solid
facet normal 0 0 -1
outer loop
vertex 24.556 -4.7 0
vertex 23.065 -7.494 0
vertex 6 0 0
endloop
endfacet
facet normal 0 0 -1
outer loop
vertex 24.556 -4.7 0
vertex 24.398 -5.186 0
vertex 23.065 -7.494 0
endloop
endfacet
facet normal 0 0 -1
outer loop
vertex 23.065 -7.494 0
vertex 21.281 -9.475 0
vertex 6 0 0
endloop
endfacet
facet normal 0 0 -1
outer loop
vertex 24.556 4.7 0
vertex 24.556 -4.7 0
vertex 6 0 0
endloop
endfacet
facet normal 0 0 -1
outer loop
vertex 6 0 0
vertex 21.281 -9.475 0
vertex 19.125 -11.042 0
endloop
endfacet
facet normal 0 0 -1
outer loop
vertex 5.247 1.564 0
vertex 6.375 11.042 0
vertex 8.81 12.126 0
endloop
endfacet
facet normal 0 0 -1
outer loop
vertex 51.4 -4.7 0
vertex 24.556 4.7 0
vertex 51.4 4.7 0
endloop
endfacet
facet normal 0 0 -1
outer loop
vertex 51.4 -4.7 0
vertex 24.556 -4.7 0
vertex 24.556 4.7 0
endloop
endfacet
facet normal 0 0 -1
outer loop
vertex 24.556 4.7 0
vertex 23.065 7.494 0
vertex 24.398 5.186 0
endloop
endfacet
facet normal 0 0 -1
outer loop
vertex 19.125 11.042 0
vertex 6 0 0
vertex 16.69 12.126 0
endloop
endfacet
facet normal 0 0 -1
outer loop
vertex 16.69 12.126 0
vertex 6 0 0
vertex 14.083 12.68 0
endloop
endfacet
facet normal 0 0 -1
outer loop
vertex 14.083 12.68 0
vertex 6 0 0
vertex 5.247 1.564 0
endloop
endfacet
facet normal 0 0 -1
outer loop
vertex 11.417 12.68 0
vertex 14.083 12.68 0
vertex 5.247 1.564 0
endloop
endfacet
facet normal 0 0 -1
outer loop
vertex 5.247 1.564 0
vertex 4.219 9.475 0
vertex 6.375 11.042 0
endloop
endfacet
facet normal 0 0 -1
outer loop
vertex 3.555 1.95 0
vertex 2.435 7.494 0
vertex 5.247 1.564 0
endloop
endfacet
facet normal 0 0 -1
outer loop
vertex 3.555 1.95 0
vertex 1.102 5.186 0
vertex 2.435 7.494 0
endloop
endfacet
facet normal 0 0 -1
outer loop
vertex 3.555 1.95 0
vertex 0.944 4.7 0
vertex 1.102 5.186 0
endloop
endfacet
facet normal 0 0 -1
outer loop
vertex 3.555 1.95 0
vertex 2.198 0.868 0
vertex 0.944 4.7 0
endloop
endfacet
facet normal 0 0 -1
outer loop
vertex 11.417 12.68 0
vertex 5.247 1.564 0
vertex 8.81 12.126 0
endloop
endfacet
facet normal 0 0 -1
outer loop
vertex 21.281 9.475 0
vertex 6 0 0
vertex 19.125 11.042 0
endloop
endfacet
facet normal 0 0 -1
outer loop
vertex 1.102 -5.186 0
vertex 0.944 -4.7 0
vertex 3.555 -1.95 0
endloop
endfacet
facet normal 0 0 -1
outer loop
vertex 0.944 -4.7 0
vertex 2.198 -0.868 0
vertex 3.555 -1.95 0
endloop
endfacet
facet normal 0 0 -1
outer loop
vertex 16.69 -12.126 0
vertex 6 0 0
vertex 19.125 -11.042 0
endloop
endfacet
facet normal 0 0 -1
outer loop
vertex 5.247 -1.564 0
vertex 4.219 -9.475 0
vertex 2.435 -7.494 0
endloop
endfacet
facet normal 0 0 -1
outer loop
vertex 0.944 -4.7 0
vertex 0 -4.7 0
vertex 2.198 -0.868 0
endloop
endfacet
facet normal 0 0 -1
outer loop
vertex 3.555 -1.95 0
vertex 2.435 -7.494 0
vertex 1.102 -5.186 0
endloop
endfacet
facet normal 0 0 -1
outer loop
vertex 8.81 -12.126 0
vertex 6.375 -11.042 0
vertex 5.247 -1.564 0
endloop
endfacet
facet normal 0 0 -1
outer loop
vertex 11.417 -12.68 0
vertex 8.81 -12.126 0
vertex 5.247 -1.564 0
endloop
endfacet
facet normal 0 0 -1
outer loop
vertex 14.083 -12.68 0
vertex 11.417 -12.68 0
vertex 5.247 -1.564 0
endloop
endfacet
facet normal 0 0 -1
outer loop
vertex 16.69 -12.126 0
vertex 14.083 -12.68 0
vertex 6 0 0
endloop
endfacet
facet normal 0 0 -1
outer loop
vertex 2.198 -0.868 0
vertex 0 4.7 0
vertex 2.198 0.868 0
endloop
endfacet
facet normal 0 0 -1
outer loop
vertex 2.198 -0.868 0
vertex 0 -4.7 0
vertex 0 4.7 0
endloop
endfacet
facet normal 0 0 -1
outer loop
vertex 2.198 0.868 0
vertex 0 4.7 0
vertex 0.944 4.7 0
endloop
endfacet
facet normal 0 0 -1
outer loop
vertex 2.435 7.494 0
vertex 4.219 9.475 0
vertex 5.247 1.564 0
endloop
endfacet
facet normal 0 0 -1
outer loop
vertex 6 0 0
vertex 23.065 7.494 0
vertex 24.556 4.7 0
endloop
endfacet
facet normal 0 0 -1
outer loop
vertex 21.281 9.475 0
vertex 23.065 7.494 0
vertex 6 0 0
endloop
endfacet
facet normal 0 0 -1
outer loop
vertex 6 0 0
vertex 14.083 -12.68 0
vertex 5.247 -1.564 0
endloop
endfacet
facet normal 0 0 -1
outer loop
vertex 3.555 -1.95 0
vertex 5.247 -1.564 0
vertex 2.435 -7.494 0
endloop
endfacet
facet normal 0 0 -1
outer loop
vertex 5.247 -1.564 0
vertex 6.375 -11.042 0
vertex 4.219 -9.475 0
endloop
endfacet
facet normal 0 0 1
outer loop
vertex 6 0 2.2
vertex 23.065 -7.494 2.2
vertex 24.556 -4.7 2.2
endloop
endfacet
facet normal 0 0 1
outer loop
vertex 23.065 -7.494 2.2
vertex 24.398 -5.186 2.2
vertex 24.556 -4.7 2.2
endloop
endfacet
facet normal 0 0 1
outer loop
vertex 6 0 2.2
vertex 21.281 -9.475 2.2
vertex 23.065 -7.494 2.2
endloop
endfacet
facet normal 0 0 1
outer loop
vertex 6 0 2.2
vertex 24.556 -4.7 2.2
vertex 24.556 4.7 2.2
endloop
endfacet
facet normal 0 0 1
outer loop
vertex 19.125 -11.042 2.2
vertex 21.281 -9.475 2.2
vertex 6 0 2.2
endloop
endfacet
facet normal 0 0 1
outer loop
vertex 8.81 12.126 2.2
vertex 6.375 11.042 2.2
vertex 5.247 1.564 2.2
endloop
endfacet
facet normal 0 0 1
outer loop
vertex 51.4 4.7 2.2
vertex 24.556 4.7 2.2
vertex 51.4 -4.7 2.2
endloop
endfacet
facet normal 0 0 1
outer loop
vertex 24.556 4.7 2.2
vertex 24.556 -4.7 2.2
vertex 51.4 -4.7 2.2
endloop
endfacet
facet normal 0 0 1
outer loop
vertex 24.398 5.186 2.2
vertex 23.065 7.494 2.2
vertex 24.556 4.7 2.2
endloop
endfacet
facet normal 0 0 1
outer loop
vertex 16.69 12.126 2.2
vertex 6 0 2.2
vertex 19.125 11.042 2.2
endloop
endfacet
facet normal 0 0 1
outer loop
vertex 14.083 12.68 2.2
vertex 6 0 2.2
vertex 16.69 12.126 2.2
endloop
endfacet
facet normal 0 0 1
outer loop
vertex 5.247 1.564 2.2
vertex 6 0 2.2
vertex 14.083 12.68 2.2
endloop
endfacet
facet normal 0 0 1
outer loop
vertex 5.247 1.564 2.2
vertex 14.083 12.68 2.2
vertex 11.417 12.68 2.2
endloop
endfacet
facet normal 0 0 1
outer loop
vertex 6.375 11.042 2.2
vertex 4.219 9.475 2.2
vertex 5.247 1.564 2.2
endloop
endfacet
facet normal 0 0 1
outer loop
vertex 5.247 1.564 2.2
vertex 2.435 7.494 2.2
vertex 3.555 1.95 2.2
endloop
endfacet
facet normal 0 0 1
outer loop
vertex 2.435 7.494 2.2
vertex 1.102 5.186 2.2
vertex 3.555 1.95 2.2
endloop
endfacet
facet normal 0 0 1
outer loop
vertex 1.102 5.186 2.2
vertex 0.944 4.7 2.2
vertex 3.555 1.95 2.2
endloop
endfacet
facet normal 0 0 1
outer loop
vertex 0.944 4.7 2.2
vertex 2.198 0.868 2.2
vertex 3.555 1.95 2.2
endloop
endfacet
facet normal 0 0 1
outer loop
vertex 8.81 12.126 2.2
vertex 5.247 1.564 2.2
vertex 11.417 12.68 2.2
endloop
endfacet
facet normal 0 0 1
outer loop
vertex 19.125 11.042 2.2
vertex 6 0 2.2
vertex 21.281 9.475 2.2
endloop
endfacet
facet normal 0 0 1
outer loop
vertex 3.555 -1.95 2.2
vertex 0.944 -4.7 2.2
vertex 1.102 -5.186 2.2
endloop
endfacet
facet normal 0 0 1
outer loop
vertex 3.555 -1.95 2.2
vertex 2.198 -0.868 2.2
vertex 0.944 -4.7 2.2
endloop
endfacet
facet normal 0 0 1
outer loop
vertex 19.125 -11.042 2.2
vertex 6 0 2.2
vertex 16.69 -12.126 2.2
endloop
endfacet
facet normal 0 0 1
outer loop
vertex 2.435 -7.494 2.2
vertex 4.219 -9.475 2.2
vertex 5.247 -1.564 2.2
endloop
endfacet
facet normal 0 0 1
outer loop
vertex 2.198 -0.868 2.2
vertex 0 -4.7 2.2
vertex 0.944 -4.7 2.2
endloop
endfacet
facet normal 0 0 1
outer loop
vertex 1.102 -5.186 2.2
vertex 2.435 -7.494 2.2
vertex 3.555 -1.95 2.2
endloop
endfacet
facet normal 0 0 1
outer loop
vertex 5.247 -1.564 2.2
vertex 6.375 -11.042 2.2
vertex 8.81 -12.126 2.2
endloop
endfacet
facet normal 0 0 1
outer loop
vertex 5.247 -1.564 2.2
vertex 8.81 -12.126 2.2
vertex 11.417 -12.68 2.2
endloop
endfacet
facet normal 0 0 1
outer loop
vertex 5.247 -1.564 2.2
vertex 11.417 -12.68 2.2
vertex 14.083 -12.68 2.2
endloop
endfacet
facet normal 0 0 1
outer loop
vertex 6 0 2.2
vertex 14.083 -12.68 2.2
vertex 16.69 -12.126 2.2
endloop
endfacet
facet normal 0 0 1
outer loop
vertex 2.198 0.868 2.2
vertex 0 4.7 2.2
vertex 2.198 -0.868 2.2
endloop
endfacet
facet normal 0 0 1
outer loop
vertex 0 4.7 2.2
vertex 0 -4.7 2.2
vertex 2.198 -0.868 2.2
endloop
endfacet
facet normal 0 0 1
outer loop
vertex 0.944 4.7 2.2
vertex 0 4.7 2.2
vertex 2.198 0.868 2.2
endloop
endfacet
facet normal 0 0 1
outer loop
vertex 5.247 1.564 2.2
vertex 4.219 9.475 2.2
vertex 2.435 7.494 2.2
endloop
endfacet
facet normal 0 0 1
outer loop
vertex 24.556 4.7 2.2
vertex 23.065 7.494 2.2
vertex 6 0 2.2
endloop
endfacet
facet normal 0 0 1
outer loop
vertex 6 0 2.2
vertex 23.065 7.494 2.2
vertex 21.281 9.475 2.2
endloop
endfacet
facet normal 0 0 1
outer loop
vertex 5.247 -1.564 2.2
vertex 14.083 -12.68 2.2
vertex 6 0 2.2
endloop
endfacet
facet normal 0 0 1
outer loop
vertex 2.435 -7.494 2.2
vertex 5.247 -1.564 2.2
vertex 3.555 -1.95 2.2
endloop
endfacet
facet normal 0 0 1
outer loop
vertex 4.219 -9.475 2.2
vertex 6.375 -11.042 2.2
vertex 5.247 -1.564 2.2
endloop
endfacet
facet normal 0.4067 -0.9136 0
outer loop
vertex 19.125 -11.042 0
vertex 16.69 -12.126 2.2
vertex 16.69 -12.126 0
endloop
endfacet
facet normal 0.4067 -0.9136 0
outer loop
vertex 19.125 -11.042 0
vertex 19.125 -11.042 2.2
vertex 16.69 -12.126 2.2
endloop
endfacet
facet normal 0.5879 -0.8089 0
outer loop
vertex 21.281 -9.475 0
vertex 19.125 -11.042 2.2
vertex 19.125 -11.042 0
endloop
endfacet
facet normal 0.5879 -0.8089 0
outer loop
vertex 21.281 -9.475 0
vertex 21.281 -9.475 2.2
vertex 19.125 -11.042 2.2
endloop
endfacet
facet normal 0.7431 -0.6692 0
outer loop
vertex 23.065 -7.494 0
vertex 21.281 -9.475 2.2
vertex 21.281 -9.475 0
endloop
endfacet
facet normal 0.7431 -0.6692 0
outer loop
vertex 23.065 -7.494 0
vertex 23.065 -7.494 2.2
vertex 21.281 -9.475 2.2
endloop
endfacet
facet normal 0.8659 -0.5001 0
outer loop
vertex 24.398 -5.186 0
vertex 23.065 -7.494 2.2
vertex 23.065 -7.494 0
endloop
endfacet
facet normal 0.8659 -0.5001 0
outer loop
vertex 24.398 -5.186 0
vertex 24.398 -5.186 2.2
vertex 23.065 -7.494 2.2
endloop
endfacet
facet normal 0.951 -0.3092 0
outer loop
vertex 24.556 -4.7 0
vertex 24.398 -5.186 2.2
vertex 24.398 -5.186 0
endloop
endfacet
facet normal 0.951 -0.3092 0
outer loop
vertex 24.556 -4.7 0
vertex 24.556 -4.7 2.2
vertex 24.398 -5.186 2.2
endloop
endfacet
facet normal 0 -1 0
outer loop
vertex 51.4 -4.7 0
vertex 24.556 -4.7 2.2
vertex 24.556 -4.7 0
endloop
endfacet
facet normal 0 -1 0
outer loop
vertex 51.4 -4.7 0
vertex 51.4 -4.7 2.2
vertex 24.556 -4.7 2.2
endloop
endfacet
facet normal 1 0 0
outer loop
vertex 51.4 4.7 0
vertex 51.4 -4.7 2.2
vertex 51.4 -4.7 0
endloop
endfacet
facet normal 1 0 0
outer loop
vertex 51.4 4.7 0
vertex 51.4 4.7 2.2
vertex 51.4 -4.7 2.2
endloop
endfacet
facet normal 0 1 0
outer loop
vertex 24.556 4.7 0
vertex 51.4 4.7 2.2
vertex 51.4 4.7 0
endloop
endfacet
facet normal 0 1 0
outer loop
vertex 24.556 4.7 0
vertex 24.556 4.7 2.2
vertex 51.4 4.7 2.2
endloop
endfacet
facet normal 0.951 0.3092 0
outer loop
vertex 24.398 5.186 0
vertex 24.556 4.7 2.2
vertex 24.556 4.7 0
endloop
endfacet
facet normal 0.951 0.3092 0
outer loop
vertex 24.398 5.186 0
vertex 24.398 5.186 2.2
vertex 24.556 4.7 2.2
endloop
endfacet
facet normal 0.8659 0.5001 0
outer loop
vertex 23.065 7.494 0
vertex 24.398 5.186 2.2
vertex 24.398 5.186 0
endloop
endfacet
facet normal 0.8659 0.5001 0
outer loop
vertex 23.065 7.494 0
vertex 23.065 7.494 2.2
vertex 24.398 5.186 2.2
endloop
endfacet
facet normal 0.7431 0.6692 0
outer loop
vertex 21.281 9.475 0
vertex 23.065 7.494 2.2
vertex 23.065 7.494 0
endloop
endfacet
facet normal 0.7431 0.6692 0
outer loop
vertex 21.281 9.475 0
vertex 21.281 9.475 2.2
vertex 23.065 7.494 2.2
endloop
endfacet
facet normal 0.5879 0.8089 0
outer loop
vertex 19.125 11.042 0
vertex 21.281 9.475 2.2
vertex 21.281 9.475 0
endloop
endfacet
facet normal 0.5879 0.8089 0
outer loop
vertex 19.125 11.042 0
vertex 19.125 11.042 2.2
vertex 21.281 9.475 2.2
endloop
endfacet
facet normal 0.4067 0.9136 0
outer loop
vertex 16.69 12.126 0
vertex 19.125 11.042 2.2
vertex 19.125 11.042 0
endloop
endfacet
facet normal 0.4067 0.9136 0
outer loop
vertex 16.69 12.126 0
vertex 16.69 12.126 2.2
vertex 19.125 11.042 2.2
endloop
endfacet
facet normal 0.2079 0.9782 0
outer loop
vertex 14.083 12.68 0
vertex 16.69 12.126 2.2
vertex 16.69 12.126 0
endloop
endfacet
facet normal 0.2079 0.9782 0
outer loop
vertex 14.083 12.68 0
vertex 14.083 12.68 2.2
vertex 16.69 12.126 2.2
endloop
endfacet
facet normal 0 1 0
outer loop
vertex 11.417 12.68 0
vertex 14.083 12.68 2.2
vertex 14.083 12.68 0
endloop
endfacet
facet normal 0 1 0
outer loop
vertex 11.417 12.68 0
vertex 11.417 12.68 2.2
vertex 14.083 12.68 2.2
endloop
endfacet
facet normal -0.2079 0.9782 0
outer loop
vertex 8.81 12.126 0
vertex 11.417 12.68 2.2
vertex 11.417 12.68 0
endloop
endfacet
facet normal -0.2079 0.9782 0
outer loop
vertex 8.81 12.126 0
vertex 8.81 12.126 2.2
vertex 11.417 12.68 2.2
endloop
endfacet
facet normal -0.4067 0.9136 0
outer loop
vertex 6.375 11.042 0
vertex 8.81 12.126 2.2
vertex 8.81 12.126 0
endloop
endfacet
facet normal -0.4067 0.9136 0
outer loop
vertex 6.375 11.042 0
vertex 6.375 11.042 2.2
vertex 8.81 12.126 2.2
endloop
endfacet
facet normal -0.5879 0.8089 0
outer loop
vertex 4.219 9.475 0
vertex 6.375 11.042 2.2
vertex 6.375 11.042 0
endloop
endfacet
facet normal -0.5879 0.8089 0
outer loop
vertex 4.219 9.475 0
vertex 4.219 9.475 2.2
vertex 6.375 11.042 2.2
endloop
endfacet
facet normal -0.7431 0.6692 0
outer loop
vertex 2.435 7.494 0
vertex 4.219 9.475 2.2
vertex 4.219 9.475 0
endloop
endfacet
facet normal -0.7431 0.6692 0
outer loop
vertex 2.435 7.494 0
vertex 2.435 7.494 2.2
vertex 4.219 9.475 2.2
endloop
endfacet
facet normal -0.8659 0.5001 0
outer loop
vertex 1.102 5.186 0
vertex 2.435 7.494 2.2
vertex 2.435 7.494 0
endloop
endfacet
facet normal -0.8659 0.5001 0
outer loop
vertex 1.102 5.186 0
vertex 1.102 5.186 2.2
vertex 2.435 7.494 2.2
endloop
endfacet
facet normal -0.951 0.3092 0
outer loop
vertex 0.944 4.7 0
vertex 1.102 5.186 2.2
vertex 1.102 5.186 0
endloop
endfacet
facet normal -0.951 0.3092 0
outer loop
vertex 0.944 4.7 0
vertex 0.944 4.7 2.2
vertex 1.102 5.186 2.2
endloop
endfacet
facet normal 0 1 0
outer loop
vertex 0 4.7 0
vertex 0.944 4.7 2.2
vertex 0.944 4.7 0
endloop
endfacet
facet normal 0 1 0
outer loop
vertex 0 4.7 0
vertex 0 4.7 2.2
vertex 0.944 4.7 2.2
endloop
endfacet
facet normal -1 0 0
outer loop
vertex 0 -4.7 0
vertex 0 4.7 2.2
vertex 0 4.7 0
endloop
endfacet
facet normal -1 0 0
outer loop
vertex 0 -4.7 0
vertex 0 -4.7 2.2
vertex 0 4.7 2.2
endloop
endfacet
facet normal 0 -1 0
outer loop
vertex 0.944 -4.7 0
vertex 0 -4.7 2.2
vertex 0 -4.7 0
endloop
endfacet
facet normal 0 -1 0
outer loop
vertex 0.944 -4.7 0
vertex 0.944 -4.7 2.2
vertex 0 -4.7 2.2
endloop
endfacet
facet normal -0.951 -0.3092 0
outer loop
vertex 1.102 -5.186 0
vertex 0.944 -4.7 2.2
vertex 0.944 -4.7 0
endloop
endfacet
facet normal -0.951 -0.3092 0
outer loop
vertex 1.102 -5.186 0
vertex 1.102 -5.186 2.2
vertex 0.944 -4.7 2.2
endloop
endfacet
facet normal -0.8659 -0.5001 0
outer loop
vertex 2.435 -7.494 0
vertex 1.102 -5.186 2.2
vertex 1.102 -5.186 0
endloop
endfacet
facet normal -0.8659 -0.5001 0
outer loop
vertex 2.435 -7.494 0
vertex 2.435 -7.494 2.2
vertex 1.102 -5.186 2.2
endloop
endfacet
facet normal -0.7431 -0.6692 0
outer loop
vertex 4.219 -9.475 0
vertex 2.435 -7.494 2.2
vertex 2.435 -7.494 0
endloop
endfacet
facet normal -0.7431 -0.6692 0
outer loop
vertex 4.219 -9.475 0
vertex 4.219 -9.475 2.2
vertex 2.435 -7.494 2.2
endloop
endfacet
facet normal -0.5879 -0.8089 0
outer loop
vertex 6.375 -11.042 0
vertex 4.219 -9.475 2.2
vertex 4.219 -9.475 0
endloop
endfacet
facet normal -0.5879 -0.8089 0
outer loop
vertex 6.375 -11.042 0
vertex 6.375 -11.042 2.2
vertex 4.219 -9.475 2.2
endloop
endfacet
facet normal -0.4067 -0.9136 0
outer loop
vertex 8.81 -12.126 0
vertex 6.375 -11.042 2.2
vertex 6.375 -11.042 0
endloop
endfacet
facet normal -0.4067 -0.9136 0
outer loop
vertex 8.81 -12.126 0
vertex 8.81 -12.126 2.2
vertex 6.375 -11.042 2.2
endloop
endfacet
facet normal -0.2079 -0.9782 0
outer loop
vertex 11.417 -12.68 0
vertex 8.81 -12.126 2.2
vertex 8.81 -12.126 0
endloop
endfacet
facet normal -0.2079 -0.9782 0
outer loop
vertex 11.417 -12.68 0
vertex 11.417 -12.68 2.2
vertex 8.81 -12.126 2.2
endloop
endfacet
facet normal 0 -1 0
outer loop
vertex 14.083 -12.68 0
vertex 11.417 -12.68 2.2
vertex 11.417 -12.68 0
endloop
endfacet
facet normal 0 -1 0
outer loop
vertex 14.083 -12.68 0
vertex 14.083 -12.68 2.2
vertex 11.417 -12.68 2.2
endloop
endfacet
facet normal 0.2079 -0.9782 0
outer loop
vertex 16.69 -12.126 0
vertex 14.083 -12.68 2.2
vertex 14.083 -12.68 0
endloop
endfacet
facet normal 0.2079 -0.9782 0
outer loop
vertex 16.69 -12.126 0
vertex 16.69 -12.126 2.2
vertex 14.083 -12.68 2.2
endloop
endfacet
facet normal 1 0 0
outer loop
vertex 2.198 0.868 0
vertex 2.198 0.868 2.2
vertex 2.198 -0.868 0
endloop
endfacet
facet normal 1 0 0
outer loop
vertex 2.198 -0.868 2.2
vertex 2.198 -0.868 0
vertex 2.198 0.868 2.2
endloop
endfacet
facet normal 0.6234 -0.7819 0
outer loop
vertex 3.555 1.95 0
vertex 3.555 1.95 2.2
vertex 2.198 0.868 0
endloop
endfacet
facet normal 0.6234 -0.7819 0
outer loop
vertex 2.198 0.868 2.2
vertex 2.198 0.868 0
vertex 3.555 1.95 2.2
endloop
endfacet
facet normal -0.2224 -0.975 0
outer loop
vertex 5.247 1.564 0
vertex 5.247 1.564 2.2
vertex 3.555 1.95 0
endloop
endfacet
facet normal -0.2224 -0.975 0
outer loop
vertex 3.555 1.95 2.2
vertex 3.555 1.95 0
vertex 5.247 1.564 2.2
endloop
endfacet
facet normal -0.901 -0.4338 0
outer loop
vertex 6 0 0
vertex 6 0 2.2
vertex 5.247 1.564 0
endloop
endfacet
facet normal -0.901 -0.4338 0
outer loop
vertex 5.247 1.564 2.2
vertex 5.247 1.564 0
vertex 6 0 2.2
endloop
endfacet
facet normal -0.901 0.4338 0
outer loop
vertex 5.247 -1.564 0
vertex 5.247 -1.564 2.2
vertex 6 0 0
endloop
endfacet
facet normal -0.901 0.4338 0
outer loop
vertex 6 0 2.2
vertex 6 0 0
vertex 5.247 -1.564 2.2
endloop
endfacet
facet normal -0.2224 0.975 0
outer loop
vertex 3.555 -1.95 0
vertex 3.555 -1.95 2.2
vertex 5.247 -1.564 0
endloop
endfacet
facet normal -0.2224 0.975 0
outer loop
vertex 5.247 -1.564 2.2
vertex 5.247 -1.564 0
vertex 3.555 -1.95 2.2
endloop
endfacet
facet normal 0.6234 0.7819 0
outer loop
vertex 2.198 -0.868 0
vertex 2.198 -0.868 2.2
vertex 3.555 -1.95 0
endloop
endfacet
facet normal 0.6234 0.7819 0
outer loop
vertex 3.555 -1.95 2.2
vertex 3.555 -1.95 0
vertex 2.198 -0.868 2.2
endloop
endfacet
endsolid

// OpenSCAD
/*https://upload.wikimedia.org/wikipedia/commons/thumb/f/fb/Parts_of_a_Yale_lock-type_key.svg/676px-Parts_of_a_Yale_lock-type_key.svg.png
*/
/* height width length  */

bow_diameter=25.5;
ring_hole_diameter=4;
ring_hole_place=4;
Shoulder_width=9.4;
Length=51.4;


linear_extrude(height = 2.2){
difference(){
union(){
translate([bow_diameter/2,0,0])circle(d=bow_diameter);

translate([0,-Shoulder_width/2,0])square([Length,Shoulder_width],center=false);
}
translate([ring_hole_place,0,0])circle(d=ring_hole_diameter);
}
}
